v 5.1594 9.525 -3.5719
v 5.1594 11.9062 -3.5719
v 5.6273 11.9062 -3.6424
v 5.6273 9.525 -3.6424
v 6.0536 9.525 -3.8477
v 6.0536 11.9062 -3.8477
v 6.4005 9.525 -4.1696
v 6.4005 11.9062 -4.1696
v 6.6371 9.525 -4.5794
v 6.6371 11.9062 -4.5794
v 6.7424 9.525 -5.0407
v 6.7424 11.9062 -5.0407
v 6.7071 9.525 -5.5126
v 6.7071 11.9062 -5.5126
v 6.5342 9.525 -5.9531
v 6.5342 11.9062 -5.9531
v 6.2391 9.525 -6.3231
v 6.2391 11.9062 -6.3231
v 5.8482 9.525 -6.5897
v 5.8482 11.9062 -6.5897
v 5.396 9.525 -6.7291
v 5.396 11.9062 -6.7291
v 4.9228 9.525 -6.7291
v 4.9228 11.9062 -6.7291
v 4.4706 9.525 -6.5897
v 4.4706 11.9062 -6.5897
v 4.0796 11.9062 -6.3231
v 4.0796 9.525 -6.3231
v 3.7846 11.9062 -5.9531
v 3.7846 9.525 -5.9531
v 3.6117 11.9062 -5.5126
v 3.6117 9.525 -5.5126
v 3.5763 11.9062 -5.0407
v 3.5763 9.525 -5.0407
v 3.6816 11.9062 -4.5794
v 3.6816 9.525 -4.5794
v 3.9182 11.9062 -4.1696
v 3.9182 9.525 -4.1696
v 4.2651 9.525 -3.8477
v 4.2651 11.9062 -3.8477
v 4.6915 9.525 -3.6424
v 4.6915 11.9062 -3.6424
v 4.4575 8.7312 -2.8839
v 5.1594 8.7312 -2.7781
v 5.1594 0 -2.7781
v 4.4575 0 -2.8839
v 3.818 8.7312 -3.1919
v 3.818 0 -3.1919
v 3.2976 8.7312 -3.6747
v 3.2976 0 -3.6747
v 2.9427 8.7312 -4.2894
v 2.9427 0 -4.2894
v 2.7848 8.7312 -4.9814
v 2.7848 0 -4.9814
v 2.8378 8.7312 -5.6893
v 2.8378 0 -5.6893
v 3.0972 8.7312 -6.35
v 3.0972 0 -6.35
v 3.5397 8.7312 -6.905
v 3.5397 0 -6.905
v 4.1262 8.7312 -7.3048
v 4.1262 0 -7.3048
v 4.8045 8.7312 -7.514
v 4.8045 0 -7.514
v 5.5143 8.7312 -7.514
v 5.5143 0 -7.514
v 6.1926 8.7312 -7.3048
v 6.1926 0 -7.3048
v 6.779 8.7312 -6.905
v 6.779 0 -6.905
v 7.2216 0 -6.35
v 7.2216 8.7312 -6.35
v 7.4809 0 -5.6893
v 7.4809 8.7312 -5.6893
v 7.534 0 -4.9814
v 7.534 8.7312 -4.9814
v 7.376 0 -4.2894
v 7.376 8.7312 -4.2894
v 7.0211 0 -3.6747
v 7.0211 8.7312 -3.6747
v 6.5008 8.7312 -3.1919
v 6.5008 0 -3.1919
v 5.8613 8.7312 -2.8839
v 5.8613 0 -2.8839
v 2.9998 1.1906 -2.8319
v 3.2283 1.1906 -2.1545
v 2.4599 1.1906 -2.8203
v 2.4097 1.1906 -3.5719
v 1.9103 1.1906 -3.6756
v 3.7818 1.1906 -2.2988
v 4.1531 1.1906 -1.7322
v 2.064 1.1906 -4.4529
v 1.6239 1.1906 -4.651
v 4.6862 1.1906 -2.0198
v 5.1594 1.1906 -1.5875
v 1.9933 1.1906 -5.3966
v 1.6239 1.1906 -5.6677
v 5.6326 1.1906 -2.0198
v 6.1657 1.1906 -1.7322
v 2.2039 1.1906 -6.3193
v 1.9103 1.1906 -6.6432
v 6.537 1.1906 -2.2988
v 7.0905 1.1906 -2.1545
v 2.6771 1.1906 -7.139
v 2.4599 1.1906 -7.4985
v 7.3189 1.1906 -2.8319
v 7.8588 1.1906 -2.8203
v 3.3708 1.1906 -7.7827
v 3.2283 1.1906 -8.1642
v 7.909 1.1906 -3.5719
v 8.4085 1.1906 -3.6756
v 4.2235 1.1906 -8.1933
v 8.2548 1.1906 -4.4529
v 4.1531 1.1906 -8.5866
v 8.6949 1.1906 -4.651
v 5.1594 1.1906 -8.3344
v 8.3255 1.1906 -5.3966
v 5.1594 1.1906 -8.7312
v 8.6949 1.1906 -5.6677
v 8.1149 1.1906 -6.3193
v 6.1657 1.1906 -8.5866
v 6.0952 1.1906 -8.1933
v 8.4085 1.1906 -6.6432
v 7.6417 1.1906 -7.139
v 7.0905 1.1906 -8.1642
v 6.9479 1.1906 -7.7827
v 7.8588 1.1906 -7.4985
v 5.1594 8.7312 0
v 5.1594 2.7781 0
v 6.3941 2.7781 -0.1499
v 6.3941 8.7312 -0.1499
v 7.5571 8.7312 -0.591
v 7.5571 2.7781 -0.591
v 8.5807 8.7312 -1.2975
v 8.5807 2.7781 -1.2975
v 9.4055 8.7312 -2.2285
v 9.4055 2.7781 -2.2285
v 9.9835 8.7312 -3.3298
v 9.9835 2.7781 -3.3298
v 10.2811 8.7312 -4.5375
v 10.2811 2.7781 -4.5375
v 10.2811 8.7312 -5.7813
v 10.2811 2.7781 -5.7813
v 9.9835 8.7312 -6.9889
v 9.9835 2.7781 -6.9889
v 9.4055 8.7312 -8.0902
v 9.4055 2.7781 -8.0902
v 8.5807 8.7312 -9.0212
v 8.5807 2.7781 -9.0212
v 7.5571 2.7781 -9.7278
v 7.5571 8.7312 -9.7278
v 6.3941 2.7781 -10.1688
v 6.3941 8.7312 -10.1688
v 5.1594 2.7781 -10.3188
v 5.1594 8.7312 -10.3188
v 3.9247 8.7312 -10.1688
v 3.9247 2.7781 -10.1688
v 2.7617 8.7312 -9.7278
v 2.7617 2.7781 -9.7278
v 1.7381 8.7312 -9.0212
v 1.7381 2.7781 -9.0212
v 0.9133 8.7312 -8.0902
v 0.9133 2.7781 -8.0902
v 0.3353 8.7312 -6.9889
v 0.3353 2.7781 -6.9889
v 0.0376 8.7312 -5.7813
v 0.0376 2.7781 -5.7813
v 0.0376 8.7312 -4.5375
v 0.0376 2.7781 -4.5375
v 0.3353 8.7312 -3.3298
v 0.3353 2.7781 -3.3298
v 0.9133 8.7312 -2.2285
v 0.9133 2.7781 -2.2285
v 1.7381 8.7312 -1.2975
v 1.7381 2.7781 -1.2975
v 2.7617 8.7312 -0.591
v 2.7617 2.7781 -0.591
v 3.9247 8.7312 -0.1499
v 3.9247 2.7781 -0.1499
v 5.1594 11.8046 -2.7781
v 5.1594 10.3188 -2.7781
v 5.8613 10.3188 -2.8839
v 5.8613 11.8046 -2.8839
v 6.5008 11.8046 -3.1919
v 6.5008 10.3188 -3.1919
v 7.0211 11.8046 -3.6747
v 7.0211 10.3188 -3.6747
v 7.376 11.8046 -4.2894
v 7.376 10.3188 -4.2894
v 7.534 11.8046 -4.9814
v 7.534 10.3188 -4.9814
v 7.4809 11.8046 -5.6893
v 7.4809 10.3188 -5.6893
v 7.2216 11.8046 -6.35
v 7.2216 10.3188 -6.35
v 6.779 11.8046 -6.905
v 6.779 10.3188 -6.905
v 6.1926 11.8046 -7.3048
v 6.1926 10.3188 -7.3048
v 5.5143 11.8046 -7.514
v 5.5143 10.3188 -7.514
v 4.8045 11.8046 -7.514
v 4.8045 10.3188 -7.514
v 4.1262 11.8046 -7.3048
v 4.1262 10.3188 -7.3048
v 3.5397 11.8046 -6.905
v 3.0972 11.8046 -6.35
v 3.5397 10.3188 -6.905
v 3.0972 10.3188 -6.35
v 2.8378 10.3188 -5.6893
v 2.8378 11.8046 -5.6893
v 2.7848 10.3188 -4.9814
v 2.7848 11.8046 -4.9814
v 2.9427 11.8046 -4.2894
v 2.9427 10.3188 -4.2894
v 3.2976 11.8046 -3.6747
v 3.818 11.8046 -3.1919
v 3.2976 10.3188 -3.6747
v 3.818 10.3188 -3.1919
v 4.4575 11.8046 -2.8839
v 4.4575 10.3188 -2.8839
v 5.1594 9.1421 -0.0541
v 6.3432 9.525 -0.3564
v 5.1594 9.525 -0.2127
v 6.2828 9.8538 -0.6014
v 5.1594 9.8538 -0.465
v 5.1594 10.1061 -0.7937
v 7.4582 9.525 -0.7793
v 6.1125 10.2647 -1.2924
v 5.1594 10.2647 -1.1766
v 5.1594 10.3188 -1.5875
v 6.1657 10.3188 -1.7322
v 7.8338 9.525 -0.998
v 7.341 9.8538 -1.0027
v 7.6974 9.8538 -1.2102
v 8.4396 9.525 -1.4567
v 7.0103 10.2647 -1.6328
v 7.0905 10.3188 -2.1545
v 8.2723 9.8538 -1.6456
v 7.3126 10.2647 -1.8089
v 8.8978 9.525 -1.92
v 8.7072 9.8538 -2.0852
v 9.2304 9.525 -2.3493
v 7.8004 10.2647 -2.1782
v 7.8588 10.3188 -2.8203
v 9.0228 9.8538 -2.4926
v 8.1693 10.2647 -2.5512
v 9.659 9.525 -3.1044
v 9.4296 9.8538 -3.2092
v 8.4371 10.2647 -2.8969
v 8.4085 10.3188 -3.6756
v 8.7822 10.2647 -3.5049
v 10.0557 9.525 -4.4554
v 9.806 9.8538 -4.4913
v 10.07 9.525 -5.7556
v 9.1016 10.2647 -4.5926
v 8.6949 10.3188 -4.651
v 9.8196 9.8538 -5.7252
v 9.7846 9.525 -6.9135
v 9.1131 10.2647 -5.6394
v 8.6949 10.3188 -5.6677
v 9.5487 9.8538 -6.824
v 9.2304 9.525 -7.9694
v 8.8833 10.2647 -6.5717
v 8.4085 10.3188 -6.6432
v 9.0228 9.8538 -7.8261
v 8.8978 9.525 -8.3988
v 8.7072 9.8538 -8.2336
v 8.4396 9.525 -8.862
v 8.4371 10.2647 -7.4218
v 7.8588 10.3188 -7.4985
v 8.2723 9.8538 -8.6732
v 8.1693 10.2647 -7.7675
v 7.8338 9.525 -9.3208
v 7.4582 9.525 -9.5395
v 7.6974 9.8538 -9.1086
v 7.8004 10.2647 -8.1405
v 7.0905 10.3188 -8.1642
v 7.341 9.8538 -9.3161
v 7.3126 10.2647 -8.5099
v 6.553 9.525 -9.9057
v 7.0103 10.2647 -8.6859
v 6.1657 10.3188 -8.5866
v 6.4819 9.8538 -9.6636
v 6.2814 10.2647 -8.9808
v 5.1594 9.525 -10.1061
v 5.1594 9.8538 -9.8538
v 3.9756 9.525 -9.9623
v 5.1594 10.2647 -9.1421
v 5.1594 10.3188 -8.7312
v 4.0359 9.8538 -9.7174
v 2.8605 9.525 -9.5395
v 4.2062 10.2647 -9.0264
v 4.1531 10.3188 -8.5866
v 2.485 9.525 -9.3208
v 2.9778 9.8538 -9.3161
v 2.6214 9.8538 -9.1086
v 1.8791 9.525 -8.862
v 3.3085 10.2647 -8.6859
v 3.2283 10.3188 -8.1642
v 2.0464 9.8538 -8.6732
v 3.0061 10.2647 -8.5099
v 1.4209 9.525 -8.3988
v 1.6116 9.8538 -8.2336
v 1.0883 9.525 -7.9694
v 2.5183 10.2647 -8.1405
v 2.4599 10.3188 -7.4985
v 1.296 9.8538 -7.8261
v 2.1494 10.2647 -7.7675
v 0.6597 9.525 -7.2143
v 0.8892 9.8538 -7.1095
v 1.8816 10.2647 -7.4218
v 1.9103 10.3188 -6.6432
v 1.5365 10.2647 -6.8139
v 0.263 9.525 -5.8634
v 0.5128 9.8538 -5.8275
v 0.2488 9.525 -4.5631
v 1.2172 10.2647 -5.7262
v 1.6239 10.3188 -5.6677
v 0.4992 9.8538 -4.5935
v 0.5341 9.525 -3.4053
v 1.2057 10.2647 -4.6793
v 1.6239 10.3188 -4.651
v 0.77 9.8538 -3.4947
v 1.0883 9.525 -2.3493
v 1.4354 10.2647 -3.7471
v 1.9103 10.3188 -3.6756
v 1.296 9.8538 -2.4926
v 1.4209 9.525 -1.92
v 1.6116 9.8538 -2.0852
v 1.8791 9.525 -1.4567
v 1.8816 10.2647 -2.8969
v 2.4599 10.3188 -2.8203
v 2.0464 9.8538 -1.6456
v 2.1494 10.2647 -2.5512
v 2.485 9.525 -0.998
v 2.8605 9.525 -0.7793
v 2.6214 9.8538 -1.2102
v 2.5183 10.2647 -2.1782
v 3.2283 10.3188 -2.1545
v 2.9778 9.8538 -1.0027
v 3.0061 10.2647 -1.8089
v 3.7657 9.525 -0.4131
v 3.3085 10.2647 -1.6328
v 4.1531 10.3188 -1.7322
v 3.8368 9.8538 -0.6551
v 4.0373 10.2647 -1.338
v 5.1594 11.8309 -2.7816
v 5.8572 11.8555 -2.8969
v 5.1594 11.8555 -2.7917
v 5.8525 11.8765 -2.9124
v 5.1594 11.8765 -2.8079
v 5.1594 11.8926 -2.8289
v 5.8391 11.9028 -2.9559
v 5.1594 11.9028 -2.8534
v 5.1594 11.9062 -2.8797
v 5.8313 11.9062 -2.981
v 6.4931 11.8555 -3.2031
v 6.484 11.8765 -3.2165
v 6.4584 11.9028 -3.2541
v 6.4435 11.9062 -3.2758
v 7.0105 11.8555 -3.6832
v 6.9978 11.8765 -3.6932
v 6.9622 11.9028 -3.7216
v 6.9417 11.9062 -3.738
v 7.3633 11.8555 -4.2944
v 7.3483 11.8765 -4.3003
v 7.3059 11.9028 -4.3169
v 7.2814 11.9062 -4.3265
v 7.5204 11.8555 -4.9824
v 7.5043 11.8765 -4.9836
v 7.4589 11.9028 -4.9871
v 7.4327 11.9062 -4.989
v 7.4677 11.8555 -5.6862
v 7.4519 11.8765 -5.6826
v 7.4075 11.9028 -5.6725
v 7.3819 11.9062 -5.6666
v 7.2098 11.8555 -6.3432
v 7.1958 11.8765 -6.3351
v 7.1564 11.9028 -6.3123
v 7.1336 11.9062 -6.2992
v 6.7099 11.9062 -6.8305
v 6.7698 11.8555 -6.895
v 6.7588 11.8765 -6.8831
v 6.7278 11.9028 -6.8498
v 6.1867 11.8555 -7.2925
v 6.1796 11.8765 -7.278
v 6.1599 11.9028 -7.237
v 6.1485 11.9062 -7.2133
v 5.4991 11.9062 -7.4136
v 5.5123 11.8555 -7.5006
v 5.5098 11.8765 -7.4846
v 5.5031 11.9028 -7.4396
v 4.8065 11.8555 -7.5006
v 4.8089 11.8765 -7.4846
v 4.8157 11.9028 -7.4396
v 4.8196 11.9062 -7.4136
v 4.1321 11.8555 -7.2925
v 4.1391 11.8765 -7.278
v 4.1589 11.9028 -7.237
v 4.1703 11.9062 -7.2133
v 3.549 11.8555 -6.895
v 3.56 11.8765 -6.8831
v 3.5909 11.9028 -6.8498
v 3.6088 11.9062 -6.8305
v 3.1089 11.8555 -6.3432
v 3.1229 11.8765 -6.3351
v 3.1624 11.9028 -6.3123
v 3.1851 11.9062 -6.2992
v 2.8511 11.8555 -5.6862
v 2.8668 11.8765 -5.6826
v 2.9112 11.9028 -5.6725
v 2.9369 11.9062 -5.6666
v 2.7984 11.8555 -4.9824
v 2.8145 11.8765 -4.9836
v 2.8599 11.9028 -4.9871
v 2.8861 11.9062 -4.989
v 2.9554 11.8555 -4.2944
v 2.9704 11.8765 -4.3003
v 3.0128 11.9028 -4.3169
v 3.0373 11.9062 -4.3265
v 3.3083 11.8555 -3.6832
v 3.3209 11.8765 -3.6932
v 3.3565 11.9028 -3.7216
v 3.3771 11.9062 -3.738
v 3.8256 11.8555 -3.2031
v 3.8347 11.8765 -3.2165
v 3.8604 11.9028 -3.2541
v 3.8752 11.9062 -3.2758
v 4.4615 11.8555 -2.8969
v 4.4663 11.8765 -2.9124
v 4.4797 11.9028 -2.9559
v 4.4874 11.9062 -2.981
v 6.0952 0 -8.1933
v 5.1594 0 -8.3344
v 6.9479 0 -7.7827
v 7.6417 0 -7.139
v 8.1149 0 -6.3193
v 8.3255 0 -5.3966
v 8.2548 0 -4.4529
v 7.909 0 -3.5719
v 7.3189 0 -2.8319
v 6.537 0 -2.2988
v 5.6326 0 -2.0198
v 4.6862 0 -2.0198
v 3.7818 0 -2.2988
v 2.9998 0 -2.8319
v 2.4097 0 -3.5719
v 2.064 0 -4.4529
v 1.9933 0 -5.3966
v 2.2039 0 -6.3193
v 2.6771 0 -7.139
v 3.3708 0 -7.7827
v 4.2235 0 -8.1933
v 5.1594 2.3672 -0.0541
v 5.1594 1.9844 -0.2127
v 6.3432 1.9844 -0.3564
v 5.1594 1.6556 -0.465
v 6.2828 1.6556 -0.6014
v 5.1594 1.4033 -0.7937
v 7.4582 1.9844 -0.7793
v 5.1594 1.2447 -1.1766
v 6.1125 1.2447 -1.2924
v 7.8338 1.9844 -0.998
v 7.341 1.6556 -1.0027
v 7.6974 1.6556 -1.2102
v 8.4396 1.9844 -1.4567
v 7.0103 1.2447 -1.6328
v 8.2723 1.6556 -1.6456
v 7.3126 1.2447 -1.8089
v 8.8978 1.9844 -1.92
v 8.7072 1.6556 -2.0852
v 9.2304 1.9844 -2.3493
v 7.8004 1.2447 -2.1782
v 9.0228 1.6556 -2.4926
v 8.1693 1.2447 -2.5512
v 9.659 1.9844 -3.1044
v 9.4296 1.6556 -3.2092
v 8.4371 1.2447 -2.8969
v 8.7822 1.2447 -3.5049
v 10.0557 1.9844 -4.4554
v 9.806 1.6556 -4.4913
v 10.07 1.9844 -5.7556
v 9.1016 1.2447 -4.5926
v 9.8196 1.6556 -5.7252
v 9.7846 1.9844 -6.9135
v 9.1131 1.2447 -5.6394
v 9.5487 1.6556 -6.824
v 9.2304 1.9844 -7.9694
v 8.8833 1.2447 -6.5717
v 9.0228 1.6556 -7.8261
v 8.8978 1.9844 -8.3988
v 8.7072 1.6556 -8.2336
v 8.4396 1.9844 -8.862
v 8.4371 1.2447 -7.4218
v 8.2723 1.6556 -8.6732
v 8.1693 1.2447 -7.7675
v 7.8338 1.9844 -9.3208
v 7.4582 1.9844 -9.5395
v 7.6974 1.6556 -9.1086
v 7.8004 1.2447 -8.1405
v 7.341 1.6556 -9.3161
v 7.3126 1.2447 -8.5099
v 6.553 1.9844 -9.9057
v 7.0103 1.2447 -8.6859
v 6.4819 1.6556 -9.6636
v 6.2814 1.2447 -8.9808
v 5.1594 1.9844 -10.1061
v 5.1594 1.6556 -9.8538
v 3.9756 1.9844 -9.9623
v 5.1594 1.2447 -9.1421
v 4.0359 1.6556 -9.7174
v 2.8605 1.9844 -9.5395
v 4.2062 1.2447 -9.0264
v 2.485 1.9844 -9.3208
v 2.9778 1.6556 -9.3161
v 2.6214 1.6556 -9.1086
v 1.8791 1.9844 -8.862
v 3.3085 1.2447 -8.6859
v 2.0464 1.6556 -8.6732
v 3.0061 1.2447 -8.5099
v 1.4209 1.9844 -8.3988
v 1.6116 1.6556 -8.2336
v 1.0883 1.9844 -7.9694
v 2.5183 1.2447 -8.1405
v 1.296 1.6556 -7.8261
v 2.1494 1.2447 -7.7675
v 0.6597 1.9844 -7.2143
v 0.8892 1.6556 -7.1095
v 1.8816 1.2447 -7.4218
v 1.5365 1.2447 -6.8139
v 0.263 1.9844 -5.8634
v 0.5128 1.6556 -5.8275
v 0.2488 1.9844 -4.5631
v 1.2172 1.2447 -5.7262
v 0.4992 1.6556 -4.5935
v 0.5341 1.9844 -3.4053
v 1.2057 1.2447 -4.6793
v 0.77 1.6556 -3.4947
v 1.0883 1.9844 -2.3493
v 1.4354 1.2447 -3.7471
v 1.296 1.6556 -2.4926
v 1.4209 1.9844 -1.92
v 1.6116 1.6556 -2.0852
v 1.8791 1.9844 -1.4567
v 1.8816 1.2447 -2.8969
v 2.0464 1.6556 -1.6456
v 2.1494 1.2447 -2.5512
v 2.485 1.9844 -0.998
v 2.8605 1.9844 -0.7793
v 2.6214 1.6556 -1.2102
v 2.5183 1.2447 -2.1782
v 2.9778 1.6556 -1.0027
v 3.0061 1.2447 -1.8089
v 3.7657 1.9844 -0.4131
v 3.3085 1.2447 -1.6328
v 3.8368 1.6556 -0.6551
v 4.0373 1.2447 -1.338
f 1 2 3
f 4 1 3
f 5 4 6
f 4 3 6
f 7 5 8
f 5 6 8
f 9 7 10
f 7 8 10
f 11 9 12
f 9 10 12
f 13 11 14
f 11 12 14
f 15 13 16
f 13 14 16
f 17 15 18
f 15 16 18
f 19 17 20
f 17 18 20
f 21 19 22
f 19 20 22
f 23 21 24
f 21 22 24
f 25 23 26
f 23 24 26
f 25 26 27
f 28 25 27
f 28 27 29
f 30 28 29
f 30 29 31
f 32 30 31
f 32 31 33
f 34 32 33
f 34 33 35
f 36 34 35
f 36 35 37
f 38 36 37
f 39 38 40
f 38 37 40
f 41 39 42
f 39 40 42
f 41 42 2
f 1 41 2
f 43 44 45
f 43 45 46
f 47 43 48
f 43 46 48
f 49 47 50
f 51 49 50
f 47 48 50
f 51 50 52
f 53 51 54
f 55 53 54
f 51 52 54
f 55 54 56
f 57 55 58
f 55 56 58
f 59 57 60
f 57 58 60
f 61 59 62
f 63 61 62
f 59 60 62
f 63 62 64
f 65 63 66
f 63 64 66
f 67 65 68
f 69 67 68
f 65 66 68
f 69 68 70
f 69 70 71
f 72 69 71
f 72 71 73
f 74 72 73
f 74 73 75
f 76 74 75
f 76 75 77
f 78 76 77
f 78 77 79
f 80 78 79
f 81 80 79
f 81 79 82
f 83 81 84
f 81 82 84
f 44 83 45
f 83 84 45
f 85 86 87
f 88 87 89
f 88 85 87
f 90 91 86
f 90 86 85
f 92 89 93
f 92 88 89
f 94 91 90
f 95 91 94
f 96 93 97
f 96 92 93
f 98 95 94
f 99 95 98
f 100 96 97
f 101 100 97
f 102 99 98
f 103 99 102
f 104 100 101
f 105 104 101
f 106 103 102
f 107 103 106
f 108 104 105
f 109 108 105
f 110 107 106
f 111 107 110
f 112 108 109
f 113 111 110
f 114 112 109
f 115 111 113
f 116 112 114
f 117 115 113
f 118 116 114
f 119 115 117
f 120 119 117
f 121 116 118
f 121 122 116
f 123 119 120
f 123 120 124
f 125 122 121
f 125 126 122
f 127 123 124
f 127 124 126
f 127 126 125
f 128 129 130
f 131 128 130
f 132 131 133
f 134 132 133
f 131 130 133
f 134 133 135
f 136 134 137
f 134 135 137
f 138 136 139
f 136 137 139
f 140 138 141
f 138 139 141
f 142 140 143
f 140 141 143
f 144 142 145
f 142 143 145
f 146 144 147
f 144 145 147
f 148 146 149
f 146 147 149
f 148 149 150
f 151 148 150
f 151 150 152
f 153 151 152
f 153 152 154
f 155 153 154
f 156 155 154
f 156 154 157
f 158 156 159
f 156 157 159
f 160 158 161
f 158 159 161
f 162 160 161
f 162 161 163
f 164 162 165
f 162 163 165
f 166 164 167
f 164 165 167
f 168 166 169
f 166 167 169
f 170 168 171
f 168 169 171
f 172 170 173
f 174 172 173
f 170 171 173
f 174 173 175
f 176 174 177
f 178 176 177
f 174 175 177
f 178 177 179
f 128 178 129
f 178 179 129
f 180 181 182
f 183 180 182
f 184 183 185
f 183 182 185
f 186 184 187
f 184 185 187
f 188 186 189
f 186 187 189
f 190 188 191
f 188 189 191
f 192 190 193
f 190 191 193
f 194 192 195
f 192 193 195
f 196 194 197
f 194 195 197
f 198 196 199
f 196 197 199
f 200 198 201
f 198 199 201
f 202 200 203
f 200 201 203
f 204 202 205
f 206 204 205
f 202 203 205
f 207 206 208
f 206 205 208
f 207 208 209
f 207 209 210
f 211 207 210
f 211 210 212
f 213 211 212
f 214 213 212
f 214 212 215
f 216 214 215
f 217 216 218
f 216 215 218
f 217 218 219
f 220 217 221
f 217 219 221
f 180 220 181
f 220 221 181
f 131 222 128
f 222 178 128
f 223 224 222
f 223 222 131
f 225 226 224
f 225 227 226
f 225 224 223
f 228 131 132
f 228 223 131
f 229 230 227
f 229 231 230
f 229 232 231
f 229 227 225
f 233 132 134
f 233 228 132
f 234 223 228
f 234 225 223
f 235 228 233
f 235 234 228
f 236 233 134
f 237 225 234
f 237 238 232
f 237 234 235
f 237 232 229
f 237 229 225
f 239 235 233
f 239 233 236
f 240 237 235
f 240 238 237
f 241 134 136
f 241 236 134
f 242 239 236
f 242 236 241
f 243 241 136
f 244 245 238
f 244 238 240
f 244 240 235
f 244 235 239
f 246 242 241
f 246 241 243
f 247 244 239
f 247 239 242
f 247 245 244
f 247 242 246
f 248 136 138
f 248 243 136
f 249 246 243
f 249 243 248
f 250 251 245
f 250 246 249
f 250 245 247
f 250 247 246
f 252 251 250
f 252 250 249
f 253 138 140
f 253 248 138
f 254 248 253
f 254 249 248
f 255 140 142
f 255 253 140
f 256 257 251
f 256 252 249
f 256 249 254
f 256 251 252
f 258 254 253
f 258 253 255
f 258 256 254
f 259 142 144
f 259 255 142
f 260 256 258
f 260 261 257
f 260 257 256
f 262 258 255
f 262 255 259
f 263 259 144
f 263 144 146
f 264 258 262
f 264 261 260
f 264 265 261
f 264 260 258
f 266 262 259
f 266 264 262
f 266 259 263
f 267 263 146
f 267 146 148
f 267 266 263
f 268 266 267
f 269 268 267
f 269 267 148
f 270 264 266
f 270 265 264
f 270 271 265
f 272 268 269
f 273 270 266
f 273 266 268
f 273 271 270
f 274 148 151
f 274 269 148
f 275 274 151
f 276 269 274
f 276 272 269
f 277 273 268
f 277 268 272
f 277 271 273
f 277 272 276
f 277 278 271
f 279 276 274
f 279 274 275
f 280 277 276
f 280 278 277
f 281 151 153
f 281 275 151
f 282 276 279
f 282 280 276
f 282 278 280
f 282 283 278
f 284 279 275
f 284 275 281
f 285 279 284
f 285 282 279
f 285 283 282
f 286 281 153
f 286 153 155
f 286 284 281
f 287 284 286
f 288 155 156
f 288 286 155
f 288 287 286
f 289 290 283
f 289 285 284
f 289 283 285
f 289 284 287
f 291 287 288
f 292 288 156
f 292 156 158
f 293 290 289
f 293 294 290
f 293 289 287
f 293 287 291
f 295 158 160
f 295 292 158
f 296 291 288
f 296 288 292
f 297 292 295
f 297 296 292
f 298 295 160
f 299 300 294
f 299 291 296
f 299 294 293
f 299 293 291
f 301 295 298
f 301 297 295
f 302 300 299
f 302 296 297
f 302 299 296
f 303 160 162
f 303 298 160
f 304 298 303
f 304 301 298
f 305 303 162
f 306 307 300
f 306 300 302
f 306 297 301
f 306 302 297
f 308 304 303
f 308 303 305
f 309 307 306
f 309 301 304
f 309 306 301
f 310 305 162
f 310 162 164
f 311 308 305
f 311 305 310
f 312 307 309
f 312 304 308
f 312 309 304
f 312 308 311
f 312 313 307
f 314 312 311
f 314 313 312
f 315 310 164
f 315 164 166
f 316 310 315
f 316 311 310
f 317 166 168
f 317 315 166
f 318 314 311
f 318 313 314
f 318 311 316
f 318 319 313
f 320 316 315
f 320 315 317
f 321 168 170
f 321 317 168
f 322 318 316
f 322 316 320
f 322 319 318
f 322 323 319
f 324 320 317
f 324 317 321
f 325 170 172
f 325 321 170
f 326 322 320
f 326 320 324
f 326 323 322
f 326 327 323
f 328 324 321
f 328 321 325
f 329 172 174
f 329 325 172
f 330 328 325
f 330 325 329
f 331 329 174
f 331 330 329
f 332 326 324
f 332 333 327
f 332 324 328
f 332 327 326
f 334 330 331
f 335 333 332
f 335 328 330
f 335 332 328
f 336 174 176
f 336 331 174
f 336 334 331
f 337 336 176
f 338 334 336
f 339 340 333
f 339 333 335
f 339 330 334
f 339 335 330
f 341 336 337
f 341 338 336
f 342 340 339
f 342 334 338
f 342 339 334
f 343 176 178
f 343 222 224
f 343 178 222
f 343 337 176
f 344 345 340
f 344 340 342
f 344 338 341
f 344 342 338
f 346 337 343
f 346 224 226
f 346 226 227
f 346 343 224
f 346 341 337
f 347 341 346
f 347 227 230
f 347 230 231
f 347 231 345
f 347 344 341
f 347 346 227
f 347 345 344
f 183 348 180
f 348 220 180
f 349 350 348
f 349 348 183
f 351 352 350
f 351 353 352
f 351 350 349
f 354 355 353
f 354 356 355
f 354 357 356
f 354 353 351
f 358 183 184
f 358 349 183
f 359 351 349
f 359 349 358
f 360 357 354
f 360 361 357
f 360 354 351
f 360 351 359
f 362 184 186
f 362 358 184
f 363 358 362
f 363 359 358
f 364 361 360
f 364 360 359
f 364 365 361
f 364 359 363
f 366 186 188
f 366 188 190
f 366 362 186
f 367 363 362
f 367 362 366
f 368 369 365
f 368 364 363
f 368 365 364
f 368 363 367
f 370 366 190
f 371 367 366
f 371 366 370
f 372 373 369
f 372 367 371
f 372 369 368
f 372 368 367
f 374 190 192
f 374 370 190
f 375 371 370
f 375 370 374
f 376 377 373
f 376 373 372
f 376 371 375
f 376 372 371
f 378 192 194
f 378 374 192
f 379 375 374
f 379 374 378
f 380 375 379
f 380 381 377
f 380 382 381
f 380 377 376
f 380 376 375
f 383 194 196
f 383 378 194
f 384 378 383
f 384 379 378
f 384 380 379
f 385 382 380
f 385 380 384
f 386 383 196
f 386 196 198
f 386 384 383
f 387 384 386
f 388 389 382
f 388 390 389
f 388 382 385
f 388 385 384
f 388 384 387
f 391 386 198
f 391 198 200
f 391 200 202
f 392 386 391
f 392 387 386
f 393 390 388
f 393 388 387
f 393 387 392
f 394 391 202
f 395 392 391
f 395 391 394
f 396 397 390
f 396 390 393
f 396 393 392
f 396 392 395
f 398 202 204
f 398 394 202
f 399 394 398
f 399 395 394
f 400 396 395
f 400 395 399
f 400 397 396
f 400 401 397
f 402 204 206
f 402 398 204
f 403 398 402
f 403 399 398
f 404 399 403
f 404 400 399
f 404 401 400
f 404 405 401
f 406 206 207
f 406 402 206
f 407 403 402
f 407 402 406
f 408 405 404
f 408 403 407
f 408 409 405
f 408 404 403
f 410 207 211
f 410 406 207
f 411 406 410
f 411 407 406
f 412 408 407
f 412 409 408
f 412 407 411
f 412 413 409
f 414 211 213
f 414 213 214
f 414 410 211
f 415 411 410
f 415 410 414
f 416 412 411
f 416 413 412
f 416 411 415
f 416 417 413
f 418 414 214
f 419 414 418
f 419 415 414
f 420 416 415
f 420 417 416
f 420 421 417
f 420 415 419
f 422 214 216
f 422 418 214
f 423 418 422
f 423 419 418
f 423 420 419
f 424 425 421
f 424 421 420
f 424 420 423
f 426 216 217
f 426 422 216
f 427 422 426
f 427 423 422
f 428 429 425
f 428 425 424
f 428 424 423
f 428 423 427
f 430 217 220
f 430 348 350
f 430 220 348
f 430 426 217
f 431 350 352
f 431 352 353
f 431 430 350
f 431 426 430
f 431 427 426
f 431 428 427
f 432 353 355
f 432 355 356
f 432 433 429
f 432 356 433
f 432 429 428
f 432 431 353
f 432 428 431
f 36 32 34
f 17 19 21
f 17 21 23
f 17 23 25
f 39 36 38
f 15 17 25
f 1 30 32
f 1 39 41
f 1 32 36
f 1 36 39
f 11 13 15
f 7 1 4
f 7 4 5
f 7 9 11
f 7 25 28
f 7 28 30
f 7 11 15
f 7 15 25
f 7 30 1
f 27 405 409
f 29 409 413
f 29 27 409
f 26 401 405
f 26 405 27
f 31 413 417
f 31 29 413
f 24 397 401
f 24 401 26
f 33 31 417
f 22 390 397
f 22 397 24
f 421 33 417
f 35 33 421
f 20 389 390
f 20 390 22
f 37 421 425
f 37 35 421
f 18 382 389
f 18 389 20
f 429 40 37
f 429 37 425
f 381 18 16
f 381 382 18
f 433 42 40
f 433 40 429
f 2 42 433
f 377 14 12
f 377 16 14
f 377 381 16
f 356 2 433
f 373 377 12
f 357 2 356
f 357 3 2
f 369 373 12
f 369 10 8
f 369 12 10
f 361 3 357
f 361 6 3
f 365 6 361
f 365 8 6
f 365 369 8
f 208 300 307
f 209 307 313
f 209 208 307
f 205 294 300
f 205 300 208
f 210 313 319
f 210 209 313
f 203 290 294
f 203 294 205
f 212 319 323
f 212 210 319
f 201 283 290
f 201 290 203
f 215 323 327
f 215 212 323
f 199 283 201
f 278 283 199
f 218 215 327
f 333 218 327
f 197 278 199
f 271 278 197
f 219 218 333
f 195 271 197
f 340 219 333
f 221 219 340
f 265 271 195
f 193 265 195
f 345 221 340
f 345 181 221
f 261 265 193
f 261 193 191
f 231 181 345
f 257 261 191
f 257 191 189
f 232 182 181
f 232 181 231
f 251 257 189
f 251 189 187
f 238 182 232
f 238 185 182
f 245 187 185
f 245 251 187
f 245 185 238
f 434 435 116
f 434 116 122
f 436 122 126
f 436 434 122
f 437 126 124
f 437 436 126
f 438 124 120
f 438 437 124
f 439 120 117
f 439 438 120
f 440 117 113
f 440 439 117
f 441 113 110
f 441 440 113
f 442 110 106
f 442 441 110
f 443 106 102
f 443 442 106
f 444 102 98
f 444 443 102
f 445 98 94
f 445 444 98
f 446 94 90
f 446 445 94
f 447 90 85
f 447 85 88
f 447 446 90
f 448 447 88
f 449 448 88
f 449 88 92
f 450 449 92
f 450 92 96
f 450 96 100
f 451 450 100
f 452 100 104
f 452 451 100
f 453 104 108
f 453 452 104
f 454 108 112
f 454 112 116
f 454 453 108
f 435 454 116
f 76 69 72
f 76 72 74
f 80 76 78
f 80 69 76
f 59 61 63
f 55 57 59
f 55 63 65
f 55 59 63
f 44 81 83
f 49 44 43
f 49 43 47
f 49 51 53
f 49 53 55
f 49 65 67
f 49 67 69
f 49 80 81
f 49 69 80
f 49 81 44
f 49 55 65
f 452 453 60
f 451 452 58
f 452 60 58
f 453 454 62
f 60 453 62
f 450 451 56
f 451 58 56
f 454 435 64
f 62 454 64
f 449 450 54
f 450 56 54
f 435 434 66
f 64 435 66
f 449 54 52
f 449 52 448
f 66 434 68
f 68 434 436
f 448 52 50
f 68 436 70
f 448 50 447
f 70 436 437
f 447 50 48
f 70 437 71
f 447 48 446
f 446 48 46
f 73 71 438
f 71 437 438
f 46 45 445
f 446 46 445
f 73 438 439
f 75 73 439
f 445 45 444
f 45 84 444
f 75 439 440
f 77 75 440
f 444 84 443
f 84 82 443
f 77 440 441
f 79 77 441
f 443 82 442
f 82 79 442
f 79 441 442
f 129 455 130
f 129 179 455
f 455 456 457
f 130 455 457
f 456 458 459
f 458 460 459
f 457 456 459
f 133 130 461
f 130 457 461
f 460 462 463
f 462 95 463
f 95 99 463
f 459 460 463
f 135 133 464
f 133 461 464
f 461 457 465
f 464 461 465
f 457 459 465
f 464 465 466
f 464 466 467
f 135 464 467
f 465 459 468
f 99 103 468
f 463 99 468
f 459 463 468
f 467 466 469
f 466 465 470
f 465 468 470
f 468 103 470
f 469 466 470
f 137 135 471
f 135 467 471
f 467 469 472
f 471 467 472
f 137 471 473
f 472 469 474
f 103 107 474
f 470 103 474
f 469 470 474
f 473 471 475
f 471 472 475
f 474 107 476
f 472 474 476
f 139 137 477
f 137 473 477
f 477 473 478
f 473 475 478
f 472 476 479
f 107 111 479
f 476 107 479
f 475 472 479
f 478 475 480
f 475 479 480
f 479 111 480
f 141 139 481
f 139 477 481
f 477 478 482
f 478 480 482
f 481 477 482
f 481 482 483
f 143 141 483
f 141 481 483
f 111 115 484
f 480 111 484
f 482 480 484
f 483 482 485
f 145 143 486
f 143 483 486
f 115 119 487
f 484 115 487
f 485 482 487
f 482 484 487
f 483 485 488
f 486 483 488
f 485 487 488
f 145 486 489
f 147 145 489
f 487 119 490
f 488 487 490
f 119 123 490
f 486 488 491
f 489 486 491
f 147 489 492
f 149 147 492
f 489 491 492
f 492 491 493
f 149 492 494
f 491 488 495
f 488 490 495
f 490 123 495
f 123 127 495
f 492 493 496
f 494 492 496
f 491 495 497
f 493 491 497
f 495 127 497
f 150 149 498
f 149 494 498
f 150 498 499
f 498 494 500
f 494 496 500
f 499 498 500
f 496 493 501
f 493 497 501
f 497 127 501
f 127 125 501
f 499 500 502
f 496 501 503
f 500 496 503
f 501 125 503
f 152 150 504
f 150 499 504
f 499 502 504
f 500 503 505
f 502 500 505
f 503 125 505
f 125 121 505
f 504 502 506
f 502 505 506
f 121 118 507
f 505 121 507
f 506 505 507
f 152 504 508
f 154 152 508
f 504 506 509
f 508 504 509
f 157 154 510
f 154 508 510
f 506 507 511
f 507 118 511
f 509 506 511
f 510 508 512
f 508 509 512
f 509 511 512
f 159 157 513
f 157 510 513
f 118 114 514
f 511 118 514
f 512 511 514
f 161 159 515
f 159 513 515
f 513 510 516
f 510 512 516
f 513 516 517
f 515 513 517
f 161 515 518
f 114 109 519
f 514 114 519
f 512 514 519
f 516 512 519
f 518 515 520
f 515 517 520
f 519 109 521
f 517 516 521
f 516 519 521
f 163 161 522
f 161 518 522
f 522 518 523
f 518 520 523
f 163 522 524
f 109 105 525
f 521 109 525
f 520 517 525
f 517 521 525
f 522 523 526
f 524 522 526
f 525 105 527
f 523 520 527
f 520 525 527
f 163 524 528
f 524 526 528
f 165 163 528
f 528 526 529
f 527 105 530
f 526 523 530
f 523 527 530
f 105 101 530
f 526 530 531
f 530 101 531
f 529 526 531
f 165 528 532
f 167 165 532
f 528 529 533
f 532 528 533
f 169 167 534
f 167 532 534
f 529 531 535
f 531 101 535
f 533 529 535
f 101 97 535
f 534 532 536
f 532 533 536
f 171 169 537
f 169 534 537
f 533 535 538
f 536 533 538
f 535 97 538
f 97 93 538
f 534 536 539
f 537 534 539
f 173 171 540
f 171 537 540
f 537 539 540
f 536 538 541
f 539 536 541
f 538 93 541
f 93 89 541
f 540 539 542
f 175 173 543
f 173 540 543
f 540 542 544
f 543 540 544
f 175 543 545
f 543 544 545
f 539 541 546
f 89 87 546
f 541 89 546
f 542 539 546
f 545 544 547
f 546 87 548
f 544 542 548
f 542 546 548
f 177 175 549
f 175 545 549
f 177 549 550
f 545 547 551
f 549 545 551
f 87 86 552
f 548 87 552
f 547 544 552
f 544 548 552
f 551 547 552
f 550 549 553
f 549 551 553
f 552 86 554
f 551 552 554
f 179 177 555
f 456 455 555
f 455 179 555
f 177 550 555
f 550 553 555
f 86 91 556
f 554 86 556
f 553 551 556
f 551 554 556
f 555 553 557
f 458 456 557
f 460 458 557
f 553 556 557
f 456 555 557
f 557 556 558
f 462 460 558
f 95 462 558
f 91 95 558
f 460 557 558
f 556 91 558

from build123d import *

# Parameters (mm, degrees)
SKETCH2_R           = 5.159375
BOSS_EXTRUDE2_DEPTH = 11.90625
CUT_EXTRUDE1_START  = -1.5875
SKETCH3_R           = 5.159375
SKETCH3_R_2         = 2.38125
CUT_EXTRUDE1_DEPTH  = 1.5875
SKETCH4_R           = 5.159375
SKETCH4_R_2         = 3.175
CUT_EXTRUDE2_DEPTH  = 1.190625
SKETCH5_R           = 2.38125
CUT_EXTRUDE3_DEPTH  = 8.73125
SKETCH6_R           = 1.5875
CUT_EXTRUDE4_DEPTH  = 2.38125
FILLET1_R           = 1.5875
FILLET3_R           = 0.1016


with BuildPart() as part:
    # Sketch2 → Boss-Extrude2 (new body)
    with BuildSketch(Plane(origin=(0, 0, 0), x_dir=(1, 0, 0), z_dir=(0, 1, 0))):
        with Locations(Location((5.159375, 5.159375, 0), (0, 0, 270))):
            Circle(SKETCH2_R)
    extrude(amount=BOSS_EXTRUDE2_DEPTH)

    # Sketch3 → Cut-Extrude1 (cut)
    with BuildSketch(Plane(origin=(0, 11.90625, 0), x_dir=(1, 0, 0), z_dir=(0, 1, 0)).offset(CUT_EXTRUDE1_START)):
        with Locations(Location((5.159375, 5.159375, 0), (0, 0, 270))):
            Circle(SKETCH3_R)
        with Locations(Location((5.159375, 5.159375, 0), (0, 0, 270))):
            Circle(SKETCH3_R_2, mode=Mode.SUBTRACT)
    extrude(amount=CUT_EXTRUDE1_DEPTH, mode=Mode.SUBTRACT)

    # Sketch4 → Cut-Extrude2 (cut)
    with BuildSketch(Plane.XZ):
        with Locations(Location((5.159375, -5.159375, 0), (0, 0, 270))):
            Circle(SKETCH4_R)
        with Locations(Location((5.159375, -5.159375, 0), (0, 0, 270))):
            Circle(SKETCH4_R_2, mode=Mode.SUBTRACT)
    extrude(amount=-CUT_EXTRUDE2_DEPTH, mode=Mode.SUBTRACT)

    # Sketch5 → Cut-Extrude3 (cut)
    with BuildSketch(Plane.XZ):
        with Locations(Location((5.159375, -5.159375, 0), (0, 0, 90))):
            Circle(SKETCH5_R)
    extrude(amount=-CUT_EXTRUDE3_DEPTH, mode=Mode.SUBTRACT)

    # Sketch6 → Cut-Extrude4 (cut)
    with BuildSketch(Plane(origin=(0, 11.90625, 0), x_dir=(1, 0, 0), z_dir=(0, 1, 0))):
        with Locations(Location((5.159375, 5.159375, 0), (0, 0, 270))):
            Circle(SKETCH6_R)
    extrude(amount=-CUT_EXTRUDE4_DEPTH, mode=Mode.SUBTRACT)

    # Fillet1
    fillet1_edges = [part.edges().sort_by_distance(p)[0] for p in [
        (5.159375, 1.190625, -10.31875),
        (5.159375, 10.31875, -10.31875),
    ]]
    fillet(fillet1_edges, radius=FILLET1_R)

    # Fillet3
    fillet3_edges = [part.edges().sort_by_distance(p)[0] for p in [
        (5.159375, 11.90625, -7.540625),
    ]]
    fillet(fillet3_edges, radius=FILLET3_R)


solid = part.part
